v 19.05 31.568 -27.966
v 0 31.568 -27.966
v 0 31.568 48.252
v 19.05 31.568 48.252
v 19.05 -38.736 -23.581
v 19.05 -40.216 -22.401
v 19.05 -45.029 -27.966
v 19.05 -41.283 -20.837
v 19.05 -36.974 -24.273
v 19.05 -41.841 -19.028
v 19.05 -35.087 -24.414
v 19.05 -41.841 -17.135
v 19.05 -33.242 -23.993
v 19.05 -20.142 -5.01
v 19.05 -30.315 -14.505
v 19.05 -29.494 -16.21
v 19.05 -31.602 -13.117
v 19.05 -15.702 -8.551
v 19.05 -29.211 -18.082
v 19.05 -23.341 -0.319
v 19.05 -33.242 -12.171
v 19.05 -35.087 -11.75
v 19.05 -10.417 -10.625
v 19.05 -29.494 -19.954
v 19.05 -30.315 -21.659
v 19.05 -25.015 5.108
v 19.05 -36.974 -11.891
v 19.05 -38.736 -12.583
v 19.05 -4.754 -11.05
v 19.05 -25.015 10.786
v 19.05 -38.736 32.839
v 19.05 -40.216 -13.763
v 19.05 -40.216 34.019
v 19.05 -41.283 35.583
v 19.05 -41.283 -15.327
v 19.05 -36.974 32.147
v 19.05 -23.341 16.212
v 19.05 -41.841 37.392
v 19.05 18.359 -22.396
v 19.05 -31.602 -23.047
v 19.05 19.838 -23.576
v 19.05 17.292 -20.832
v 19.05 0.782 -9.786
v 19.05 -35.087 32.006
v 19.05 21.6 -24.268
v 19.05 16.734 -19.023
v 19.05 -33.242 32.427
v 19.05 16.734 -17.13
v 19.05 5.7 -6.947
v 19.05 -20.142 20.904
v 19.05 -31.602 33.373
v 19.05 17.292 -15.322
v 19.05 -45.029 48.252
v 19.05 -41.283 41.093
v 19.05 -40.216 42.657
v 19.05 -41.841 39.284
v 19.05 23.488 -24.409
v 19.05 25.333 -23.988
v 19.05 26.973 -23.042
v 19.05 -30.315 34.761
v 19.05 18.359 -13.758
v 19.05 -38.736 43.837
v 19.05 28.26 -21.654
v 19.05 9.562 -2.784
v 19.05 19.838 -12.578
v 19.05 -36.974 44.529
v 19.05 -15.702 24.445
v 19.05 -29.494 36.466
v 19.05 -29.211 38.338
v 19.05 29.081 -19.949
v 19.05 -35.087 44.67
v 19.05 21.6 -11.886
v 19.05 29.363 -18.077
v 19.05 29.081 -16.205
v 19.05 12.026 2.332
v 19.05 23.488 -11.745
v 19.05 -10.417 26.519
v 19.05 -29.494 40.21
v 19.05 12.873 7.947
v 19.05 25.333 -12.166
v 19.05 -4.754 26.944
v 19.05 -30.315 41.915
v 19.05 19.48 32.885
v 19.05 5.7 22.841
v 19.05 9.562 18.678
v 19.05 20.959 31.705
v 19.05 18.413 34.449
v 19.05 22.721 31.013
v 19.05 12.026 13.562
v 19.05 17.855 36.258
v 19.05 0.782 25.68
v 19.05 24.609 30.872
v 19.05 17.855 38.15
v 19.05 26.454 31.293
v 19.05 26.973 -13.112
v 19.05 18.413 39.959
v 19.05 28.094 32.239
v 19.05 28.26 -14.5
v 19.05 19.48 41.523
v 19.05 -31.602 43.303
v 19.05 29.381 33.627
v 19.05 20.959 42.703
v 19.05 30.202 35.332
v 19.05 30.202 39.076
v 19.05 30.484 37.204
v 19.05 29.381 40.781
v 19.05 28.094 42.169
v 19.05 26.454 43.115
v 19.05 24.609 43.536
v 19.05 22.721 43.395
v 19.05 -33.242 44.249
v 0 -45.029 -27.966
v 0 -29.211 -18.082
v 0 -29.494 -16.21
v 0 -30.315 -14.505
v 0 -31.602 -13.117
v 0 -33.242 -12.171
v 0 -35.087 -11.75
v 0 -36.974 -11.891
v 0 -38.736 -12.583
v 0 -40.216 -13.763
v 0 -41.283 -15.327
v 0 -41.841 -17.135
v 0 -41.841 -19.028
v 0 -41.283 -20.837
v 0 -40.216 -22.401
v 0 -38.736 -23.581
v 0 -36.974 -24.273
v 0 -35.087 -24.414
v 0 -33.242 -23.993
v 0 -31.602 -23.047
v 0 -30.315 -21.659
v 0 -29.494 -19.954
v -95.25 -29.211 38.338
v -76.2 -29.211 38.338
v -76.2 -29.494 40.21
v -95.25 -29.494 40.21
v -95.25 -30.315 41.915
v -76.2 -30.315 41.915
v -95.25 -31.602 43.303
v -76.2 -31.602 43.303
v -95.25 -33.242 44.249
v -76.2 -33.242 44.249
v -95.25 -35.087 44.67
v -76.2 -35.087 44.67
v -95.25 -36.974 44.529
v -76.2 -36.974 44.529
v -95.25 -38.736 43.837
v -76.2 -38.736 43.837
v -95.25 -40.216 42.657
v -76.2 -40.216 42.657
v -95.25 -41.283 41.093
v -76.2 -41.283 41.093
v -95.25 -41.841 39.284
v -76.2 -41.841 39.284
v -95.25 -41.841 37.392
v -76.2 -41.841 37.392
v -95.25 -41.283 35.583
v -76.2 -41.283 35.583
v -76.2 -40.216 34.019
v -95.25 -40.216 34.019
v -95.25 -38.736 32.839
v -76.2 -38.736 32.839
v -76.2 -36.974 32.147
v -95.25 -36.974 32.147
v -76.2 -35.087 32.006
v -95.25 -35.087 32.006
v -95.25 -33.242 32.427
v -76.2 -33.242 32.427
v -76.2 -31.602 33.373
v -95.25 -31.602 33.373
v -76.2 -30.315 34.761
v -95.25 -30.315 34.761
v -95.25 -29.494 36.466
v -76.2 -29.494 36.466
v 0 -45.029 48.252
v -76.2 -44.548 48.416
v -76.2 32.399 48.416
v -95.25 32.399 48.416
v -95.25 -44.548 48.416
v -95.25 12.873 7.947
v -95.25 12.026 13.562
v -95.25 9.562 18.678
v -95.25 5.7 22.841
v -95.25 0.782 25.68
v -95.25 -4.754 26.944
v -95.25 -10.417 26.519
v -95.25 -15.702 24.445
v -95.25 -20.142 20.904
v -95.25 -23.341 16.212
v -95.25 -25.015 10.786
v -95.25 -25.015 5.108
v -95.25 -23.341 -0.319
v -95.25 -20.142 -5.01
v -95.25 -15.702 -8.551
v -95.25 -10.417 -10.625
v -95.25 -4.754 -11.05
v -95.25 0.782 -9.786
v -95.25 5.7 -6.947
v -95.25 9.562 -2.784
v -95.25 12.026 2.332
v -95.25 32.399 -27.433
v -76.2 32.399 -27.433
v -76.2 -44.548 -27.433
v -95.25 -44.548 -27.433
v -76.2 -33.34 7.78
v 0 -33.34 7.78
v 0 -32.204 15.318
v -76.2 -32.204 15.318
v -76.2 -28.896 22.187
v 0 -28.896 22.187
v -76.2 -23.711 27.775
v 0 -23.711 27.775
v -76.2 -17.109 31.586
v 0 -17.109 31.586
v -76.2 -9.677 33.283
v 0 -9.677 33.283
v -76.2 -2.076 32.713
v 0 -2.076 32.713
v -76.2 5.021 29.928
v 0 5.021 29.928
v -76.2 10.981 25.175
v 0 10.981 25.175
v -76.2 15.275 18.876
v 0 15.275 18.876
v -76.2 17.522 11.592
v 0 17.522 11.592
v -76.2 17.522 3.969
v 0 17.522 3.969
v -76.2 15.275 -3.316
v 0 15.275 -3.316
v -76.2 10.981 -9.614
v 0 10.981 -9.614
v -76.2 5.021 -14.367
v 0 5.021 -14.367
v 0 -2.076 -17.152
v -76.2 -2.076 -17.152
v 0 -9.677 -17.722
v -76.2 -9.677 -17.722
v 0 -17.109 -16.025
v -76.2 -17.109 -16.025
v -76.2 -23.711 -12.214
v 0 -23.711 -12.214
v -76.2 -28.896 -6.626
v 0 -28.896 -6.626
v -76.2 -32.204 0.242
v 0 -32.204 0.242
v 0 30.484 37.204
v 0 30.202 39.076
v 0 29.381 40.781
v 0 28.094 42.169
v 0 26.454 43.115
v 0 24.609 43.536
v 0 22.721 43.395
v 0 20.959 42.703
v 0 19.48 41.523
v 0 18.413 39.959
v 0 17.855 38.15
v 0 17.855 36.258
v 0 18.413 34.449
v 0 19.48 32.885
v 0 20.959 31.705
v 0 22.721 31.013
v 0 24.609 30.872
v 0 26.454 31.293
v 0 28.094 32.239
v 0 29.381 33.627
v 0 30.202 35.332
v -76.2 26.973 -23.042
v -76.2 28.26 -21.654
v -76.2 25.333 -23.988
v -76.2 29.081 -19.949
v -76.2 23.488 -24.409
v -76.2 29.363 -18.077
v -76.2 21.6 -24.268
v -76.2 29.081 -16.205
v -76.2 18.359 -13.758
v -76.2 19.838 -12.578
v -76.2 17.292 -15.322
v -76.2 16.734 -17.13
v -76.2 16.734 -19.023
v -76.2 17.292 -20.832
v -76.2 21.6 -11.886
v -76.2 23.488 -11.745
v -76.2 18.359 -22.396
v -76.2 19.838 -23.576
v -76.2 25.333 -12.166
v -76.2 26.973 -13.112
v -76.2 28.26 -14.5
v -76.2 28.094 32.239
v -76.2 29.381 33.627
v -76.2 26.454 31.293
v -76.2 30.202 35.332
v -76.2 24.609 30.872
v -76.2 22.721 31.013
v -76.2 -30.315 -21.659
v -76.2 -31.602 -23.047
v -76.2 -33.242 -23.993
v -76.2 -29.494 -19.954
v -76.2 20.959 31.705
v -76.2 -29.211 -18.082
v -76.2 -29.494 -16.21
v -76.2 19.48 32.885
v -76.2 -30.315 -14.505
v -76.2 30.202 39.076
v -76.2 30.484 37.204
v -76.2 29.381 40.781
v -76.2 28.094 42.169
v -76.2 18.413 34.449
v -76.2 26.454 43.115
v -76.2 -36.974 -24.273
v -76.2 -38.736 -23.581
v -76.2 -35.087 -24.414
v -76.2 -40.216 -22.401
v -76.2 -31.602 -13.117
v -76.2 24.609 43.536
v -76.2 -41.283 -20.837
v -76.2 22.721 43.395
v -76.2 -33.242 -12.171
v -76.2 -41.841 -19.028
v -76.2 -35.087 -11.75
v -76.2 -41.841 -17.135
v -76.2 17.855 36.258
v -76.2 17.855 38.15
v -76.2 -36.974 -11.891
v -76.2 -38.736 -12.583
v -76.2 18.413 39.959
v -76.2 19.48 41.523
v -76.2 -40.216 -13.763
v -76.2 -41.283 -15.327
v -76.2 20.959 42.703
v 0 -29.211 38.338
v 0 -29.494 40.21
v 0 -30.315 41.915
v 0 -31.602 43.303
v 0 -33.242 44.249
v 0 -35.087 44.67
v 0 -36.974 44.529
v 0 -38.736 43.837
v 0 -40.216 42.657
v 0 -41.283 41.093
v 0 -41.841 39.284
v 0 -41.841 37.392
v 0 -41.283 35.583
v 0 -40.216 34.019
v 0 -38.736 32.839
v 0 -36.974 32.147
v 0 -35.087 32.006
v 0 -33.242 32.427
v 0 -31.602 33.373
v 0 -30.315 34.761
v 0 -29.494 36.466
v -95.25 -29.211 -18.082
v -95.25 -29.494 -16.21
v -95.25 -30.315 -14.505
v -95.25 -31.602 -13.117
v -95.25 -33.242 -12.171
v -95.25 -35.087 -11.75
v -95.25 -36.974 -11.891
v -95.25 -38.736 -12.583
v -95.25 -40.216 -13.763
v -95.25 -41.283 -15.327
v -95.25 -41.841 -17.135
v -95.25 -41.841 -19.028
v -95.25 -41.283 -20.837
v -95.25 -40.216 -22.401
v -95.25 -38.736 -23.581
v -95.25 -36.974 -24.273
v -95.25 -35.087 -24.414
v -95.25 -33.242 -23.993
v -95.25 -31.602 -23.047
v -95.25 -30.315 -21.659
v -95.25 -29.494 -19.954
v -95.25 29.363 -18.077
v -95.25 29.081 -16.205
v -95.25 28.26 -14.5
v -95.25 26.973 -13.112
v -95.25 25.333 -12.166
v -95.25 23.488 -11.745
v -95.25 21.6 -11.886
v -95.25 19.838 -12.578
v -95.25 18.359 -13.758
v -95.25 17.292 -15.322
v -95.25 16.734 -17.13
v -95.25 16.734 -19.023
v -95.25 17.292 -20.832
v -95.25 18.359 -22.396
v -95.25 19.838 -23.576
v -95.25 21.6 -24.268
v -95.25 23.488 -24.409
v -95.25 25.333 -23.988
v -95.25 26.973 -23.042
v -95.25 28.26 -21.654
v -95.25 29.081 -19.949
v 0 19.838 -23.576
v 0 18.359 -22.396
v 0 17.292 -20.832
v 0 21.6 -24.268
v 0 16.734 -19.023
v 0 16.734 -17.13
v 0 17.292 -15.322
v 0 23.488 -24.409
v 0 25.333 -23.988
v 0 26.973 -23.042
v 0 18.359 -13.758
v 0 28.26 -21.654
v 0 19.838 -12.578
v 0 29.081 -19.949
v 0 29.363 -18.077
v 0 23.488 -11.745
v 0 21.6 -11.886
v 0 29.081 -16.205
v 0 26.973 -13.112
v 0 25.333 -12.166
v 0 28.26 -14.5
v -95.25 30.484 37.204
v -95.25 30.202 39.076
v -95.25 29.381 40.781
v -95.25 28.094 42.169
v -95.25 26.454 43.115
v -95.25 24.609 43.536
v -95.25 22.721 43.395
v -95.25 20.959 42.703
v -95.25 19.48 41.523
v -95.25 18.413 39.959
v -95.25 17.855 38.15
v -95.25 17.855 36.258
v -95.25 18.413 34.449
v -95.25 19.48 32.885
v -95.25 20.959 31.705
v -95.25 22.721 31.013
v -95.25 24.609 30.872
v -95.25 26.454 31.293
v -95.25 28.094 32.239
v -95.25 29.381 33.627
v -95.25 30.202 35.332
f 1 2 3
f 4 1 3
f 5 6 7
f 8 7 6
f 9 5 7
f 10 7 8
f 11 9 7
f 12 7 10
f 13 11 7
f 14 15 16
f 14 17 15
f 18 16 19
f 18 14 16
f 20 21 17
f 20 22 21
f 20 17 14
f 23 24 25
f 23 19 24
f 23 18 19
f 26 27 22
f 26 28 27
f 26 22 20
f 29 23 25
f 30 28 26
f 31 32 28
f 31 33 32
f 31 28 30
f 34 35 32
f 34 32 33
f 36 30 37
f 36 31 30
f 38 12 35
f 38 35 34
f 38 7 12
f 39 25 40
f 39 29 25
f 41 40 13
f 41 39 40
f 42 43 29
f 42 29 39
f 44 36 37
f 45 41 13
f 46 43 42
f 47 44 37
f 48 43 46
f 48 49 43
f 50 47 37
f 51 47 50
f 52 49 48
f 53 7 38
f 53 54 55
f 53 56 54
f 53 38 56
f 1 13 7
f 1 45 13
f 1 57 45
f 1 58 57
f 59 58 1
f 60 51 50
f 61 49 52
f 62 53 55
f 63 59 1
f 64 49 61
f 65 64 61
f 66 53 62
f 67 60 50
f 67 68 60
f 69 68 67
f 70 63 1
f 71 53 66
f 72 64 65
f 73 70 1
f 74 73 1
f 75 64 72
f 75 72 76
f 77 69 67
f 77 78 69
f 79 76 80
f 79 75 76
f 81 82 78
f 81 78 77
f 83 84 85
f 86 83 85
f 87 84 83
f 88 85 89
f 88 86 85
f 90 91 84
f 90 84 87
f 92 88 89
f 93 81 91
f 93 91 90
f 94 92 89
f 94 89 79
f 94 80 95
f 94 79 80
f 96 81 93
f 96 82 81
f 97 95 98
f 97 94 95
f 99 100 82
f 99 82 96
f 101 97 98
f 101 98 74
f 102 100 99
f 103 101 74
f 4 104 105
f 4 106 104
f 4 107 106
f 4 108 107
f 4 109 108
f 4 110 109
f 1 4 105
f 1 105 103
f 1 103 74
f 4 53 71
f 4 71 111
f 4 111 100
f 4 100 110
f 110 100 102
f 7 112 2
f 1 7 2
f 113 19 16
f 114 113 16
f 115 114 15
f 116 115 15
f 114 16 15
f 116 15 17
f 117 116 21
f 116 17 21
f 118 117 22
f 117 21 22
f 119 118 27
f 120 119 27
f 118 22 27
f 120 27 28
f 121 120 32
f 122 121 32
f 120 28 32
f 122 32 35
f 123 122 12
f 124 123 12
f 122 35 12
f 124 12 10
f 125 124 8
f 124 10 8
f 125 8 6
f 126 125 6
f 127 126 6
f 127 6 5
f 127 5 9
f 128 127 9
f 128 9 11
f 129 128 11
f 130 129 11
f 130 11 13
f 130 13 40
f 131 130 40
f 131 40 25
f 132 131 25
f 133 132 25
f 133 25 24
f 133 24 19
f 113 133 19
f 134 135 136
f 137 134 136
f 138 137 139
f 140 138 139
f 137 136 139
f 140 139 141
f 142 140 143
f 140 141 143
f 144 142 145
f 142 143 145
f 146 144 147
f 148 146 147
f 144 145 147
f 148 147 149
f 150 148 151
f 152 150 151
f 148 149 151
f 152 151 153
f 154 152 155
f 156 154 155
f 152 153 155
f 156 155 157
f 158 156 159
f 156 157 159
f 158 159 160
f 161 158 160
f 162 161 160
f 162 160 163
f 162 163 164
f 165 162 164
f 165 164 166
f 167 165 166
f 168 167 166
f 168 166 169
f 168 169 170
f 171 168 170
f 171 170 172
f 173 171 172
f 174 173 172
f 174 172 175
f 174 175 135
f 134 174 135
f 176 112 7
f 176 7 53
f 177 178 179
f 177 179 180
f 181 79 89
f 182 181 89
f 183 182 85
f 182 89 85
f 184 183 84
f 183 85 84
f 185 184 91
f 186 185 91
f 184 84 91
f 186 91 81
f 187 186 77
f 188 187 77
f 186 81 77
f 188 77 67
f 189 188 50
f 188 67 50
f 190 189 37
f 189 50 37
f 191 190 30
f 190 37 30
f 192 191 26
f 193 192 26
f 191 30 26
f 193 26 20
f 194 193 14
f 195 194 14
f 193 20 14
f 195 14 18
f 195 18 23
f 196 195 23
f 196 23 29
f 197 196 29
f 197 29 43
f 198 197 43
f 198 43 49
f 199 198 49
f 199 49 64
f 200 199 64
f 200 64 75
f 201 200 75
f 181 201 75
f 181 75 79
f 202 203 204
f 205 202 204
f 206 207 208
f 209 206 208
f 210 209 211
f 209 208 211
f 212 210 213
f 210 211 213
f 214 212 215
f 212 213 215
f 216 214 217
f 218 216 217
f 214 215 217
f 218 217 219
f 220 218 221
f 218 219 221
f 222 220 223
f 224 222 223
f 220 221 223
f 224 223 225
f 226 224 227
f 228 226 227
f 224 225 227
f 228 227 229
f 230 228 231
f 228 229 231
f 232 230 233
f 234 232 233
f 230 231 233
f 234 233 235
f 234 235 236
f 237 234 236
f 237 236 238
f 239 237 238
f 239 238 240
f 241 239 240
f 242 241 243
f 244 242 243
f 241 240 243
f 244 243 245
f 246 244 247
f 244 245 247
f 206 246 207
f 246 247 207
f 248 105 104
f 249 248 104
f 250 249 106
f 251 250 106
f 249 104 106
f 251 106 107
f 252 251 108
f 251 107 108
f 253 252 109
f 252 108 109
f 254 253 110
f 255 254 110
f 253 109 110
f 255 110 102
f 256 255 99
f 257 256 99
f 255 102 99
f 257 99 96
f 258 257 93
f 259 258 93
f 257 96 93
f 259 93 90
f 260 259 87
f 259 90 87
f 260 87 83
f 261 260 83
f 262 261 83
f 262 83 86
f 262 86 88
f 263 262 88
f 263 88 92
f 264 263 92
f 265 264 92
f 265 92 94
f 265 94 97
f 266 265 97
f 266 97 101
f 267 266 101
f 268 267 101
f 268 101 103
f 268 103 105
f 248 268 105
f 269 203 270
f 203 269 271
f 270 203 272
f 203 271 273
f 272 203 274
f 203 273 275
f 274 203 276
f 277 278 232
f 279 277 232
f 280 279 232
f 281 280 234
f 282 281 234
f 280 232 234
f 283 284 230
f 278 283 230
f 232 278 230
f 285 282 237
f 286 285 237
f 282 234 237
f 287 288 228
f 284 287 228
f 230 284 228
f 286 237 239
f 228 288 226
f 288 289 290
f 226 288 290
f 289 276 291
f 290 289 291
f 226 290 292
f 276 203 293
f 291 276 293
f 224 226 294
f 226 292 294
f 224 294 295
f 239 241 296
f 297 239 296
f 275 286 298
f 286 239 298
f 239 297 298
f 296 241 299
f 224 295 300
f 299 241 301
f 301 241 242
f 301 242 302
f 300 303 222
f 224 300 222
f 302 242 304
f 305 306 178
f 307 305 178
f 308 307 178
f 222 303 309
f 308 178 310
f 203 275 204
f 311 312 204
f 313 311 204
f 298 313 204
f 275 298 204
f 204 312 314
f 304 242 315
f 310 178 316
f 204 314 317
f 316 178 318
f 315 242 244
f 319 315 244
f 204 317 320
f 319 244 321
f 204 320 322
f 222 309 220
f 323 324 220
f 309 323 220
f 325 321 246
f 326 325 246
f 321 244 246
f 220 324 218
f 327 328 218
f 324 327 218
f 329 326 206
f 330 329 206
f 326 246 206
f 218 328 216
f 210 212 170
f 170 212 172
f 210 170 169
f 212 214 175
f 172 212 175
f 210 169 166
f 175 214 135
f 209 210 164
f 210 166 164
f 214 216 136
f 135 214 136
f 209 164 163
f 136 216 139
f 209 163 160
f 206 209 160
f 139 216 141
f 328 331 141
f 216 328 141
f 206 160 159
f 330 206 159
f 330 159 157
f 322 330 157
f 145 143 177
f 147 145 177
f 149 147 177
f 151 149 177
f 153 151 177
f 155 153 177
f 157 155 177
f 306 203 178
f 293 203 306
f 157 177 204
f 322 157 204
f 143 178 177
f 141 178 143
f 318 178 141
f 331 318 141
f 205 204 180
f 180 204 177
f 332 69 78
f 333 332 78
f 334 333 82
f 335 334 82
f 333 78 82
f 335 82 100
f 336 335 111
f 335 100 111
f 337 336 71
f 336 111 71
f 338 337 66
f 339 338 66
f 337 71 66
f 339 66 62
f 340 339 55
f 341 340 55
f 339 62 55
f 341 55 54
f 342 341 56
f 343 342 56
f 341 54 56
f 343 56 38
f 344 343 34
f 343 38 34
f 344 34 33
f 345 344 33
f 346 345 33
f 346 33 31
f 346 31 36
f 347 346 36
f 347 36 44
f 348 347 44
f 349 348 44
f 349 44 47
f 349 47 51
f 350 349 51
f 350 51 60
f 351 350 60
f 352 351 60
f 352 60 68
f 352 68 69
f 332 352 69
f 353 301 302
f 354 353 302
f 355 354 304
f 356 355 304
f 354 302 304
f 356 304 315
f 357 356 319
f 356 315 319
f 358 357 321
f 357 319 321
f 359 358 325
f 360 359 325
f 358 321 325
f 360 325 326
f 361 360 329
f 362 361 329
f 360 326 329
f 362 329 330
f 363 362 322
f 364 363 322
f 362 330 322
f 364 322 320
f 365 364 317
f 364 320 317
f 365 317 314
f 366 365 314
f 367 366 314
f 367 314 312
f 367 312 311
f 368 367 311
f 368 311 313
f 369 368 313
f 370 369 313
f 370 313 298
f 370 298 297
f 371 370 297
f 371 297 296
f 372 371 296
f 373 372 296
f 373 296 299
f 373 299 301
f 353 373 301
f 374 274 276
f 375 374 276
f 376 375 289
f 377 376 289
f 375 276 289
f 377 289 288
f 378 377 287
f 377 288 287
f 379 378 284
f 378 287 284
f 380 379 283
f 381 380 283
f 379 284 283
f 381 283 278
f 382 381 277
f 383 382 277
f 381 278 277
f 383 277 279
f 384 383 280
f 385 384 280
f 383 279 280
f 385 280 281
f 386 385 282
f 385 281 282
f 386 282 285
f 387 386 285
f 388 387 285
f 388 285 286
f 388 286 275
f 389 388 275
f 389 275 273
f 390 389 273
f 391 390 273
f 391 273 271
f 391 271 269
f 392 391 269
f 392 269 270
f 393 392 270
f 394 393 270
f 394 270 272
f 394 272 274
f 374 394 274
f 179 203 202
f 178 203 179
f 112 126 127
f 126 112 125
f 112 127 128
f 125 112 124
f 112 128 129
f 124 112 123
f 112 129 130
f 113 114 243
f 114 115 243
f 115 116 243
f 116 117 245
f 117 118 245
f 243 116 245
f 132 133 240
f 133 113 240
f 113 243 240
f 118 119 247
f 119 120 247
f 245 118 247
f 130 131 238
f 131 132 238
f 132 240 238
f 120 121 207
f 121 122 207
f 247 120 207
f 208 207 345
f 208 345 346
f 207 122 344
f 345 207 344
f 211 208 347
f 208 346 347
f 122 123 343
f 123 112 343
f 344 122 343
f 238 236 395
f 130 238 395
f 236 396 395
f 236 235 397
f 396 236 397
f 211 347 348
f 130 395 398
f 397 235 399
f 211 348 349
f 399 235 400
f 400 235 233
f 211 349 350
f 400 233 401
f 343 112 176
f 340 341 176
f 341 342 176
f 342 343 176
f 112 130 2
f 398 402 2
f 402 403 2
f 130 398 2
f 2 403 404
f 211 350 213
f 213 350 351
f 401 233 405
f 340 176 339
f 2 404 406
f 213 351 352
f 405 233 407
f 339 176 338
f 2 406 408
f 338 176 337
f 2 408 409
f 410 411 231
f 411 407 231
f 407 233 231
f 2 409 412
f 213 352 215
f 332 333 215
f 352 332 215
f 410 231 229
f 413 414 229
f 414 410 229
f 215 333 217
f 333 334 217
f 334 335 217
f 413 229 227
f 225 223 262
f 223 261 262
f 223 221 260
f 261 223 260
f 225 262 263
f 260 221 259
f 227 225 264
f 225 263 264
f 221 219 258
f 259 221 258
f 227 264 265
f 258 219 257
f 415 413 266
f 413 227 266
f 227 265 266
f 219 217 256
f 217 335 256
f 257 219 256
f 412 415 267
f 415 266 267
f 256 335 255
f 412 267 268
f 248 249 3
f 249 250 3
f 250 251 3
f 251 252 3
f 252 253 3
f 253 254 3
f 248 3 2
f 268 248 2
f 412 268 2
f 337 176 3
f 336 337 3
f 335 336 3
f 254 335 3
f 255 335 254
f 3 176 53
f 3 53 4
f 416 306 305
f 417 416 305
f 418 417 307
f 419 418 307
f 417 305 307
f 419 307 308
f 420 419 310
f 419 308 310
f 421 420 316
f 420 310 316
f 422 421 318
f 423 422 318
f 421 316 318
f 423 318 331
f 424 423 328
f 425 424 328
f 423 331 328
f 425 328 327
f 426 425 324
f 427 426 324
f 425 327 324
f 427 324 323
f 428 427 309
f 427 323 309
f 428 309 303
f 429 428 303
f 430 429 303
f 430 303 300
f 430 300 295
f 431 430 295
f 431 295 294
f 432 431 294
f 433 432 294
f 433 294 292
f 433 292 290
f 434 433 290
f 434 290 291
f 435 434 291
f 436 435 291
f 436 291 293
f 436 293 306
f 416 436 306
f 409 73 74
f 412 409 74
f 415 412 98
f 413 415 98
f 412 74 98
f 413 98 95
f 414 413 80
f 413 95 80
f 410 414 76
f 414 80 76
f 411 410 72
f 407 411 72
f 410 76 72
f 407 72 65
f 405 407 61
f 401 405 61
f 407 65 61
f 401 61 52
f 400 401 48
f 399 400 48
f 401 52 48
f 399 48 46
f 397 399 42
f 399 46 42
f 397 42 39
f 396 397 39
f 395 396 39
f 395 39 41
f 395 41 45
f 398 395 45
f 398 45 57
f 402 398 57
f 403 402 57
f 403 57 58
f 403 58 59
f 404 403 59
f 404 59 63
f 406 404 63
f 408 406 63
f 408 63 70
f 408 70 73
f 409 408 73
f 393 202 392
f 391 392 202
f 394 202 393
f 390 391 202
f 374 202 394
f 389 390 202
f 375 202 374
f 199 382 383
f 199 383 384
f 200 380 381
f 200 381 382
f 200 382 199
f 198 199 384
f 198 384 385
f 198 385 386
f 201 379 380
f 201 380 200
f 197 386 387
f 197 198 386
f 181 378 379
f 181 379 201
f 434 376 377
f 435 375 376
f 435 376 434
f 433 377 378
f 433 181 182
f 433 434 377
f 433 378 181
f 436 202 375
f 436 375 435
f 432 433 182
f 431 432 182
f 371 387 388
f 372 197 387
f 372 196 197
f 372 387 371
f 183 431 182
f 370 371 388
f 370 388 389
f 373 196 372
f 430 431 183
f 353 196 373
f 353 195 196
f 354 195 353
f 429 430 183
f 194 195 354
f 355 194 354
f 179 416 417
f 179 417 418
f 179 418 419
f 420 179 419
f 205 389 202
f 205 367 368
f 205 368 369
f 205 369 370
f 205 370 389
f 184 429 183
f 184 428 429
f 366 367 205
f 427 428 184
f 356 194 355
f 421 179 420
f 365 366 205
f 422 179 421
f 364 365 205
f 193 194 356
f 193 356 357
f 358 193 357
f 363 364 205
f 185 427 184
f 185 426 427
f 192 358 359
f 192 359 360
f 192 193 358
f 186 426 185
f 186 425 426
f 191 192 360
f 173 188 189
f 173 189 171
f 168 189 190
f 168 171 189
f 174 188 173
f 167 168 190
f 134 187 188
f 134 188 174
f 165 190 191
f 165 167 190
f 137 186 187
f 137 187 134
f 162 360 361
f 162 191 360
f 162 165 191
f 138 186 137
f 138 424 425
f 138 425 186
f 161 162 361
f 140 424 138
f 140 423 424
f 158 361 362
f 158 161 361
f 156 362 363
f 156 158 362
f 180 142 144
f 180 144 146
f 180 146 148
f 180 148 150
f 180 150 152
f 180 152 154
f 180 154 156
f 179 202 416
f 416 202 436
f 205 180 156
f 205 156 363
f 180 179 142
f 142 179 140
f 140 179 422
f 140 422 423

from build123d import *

# Parameters (mm, degrees)
F0_W     = 76.597254
F0_H     = 76.218059
F1_DEPTH = 19.05
F2_R     = 25.573728
F3_DEPTH = 76.2
F4_W     = 76.946799
F4_H     = 75.848795
F5_DEPTH = 19.05
F8_D     = 12.7
F9_D     = 38.1


with BuildPart() as f1:
    # F0 (on Right) → F1 (new body)
    with BuildSketch(Plane.YZ):
        with Locations((-6.7307, 10.143448)):
            Rectangle(F0_W, F0_H)
    extrude(amount=F1_DEPTH)

    # F2 (on face) → F3 (join)
    with BuildSketch(Plane(origin=(0, 0, 0), x_dir=(0, -1, 0), z_dir=(-1, 0, 0))):
        with Locations((7.766344, 7.780468)):
            Circle(F2_R)
    extrude(amount=F3_DEPTH)

    # F4 (on face) → F5 (join)
    with BuildSketch(Plane(origin=(-76.2, 0, 0), x_dir=(0, -1, 0), z_dir=(-1, 0, 0))):
        with Locations((6.074561, 10.491825)):
            Rectangle(F4_W, F4_H)
    extrude(amount=F5_DEPTH)

    # F8 (through all)
    with Locations(Plane(origin=(-95.25, 0, 0), x_dir=(0, -1, 0), z_dir=(-1, 0, 0))):
        with Locations((-23.013473, -18.076902), (-24.134498, 37.203994), (35.561476, 38.338061), (35.561476, -18.081902)):
            Hole(F8_D / 2)

    # F9 (through all)
    with Locations(Plane(origin=(-95.25, 0, 0), x_dir=(0, -1, 0), z_dir=(-1, 0, 0))):
        with Locations((6.17749, 7.946953)):
            Hole(F9_D / 2)


solid = f1.part
